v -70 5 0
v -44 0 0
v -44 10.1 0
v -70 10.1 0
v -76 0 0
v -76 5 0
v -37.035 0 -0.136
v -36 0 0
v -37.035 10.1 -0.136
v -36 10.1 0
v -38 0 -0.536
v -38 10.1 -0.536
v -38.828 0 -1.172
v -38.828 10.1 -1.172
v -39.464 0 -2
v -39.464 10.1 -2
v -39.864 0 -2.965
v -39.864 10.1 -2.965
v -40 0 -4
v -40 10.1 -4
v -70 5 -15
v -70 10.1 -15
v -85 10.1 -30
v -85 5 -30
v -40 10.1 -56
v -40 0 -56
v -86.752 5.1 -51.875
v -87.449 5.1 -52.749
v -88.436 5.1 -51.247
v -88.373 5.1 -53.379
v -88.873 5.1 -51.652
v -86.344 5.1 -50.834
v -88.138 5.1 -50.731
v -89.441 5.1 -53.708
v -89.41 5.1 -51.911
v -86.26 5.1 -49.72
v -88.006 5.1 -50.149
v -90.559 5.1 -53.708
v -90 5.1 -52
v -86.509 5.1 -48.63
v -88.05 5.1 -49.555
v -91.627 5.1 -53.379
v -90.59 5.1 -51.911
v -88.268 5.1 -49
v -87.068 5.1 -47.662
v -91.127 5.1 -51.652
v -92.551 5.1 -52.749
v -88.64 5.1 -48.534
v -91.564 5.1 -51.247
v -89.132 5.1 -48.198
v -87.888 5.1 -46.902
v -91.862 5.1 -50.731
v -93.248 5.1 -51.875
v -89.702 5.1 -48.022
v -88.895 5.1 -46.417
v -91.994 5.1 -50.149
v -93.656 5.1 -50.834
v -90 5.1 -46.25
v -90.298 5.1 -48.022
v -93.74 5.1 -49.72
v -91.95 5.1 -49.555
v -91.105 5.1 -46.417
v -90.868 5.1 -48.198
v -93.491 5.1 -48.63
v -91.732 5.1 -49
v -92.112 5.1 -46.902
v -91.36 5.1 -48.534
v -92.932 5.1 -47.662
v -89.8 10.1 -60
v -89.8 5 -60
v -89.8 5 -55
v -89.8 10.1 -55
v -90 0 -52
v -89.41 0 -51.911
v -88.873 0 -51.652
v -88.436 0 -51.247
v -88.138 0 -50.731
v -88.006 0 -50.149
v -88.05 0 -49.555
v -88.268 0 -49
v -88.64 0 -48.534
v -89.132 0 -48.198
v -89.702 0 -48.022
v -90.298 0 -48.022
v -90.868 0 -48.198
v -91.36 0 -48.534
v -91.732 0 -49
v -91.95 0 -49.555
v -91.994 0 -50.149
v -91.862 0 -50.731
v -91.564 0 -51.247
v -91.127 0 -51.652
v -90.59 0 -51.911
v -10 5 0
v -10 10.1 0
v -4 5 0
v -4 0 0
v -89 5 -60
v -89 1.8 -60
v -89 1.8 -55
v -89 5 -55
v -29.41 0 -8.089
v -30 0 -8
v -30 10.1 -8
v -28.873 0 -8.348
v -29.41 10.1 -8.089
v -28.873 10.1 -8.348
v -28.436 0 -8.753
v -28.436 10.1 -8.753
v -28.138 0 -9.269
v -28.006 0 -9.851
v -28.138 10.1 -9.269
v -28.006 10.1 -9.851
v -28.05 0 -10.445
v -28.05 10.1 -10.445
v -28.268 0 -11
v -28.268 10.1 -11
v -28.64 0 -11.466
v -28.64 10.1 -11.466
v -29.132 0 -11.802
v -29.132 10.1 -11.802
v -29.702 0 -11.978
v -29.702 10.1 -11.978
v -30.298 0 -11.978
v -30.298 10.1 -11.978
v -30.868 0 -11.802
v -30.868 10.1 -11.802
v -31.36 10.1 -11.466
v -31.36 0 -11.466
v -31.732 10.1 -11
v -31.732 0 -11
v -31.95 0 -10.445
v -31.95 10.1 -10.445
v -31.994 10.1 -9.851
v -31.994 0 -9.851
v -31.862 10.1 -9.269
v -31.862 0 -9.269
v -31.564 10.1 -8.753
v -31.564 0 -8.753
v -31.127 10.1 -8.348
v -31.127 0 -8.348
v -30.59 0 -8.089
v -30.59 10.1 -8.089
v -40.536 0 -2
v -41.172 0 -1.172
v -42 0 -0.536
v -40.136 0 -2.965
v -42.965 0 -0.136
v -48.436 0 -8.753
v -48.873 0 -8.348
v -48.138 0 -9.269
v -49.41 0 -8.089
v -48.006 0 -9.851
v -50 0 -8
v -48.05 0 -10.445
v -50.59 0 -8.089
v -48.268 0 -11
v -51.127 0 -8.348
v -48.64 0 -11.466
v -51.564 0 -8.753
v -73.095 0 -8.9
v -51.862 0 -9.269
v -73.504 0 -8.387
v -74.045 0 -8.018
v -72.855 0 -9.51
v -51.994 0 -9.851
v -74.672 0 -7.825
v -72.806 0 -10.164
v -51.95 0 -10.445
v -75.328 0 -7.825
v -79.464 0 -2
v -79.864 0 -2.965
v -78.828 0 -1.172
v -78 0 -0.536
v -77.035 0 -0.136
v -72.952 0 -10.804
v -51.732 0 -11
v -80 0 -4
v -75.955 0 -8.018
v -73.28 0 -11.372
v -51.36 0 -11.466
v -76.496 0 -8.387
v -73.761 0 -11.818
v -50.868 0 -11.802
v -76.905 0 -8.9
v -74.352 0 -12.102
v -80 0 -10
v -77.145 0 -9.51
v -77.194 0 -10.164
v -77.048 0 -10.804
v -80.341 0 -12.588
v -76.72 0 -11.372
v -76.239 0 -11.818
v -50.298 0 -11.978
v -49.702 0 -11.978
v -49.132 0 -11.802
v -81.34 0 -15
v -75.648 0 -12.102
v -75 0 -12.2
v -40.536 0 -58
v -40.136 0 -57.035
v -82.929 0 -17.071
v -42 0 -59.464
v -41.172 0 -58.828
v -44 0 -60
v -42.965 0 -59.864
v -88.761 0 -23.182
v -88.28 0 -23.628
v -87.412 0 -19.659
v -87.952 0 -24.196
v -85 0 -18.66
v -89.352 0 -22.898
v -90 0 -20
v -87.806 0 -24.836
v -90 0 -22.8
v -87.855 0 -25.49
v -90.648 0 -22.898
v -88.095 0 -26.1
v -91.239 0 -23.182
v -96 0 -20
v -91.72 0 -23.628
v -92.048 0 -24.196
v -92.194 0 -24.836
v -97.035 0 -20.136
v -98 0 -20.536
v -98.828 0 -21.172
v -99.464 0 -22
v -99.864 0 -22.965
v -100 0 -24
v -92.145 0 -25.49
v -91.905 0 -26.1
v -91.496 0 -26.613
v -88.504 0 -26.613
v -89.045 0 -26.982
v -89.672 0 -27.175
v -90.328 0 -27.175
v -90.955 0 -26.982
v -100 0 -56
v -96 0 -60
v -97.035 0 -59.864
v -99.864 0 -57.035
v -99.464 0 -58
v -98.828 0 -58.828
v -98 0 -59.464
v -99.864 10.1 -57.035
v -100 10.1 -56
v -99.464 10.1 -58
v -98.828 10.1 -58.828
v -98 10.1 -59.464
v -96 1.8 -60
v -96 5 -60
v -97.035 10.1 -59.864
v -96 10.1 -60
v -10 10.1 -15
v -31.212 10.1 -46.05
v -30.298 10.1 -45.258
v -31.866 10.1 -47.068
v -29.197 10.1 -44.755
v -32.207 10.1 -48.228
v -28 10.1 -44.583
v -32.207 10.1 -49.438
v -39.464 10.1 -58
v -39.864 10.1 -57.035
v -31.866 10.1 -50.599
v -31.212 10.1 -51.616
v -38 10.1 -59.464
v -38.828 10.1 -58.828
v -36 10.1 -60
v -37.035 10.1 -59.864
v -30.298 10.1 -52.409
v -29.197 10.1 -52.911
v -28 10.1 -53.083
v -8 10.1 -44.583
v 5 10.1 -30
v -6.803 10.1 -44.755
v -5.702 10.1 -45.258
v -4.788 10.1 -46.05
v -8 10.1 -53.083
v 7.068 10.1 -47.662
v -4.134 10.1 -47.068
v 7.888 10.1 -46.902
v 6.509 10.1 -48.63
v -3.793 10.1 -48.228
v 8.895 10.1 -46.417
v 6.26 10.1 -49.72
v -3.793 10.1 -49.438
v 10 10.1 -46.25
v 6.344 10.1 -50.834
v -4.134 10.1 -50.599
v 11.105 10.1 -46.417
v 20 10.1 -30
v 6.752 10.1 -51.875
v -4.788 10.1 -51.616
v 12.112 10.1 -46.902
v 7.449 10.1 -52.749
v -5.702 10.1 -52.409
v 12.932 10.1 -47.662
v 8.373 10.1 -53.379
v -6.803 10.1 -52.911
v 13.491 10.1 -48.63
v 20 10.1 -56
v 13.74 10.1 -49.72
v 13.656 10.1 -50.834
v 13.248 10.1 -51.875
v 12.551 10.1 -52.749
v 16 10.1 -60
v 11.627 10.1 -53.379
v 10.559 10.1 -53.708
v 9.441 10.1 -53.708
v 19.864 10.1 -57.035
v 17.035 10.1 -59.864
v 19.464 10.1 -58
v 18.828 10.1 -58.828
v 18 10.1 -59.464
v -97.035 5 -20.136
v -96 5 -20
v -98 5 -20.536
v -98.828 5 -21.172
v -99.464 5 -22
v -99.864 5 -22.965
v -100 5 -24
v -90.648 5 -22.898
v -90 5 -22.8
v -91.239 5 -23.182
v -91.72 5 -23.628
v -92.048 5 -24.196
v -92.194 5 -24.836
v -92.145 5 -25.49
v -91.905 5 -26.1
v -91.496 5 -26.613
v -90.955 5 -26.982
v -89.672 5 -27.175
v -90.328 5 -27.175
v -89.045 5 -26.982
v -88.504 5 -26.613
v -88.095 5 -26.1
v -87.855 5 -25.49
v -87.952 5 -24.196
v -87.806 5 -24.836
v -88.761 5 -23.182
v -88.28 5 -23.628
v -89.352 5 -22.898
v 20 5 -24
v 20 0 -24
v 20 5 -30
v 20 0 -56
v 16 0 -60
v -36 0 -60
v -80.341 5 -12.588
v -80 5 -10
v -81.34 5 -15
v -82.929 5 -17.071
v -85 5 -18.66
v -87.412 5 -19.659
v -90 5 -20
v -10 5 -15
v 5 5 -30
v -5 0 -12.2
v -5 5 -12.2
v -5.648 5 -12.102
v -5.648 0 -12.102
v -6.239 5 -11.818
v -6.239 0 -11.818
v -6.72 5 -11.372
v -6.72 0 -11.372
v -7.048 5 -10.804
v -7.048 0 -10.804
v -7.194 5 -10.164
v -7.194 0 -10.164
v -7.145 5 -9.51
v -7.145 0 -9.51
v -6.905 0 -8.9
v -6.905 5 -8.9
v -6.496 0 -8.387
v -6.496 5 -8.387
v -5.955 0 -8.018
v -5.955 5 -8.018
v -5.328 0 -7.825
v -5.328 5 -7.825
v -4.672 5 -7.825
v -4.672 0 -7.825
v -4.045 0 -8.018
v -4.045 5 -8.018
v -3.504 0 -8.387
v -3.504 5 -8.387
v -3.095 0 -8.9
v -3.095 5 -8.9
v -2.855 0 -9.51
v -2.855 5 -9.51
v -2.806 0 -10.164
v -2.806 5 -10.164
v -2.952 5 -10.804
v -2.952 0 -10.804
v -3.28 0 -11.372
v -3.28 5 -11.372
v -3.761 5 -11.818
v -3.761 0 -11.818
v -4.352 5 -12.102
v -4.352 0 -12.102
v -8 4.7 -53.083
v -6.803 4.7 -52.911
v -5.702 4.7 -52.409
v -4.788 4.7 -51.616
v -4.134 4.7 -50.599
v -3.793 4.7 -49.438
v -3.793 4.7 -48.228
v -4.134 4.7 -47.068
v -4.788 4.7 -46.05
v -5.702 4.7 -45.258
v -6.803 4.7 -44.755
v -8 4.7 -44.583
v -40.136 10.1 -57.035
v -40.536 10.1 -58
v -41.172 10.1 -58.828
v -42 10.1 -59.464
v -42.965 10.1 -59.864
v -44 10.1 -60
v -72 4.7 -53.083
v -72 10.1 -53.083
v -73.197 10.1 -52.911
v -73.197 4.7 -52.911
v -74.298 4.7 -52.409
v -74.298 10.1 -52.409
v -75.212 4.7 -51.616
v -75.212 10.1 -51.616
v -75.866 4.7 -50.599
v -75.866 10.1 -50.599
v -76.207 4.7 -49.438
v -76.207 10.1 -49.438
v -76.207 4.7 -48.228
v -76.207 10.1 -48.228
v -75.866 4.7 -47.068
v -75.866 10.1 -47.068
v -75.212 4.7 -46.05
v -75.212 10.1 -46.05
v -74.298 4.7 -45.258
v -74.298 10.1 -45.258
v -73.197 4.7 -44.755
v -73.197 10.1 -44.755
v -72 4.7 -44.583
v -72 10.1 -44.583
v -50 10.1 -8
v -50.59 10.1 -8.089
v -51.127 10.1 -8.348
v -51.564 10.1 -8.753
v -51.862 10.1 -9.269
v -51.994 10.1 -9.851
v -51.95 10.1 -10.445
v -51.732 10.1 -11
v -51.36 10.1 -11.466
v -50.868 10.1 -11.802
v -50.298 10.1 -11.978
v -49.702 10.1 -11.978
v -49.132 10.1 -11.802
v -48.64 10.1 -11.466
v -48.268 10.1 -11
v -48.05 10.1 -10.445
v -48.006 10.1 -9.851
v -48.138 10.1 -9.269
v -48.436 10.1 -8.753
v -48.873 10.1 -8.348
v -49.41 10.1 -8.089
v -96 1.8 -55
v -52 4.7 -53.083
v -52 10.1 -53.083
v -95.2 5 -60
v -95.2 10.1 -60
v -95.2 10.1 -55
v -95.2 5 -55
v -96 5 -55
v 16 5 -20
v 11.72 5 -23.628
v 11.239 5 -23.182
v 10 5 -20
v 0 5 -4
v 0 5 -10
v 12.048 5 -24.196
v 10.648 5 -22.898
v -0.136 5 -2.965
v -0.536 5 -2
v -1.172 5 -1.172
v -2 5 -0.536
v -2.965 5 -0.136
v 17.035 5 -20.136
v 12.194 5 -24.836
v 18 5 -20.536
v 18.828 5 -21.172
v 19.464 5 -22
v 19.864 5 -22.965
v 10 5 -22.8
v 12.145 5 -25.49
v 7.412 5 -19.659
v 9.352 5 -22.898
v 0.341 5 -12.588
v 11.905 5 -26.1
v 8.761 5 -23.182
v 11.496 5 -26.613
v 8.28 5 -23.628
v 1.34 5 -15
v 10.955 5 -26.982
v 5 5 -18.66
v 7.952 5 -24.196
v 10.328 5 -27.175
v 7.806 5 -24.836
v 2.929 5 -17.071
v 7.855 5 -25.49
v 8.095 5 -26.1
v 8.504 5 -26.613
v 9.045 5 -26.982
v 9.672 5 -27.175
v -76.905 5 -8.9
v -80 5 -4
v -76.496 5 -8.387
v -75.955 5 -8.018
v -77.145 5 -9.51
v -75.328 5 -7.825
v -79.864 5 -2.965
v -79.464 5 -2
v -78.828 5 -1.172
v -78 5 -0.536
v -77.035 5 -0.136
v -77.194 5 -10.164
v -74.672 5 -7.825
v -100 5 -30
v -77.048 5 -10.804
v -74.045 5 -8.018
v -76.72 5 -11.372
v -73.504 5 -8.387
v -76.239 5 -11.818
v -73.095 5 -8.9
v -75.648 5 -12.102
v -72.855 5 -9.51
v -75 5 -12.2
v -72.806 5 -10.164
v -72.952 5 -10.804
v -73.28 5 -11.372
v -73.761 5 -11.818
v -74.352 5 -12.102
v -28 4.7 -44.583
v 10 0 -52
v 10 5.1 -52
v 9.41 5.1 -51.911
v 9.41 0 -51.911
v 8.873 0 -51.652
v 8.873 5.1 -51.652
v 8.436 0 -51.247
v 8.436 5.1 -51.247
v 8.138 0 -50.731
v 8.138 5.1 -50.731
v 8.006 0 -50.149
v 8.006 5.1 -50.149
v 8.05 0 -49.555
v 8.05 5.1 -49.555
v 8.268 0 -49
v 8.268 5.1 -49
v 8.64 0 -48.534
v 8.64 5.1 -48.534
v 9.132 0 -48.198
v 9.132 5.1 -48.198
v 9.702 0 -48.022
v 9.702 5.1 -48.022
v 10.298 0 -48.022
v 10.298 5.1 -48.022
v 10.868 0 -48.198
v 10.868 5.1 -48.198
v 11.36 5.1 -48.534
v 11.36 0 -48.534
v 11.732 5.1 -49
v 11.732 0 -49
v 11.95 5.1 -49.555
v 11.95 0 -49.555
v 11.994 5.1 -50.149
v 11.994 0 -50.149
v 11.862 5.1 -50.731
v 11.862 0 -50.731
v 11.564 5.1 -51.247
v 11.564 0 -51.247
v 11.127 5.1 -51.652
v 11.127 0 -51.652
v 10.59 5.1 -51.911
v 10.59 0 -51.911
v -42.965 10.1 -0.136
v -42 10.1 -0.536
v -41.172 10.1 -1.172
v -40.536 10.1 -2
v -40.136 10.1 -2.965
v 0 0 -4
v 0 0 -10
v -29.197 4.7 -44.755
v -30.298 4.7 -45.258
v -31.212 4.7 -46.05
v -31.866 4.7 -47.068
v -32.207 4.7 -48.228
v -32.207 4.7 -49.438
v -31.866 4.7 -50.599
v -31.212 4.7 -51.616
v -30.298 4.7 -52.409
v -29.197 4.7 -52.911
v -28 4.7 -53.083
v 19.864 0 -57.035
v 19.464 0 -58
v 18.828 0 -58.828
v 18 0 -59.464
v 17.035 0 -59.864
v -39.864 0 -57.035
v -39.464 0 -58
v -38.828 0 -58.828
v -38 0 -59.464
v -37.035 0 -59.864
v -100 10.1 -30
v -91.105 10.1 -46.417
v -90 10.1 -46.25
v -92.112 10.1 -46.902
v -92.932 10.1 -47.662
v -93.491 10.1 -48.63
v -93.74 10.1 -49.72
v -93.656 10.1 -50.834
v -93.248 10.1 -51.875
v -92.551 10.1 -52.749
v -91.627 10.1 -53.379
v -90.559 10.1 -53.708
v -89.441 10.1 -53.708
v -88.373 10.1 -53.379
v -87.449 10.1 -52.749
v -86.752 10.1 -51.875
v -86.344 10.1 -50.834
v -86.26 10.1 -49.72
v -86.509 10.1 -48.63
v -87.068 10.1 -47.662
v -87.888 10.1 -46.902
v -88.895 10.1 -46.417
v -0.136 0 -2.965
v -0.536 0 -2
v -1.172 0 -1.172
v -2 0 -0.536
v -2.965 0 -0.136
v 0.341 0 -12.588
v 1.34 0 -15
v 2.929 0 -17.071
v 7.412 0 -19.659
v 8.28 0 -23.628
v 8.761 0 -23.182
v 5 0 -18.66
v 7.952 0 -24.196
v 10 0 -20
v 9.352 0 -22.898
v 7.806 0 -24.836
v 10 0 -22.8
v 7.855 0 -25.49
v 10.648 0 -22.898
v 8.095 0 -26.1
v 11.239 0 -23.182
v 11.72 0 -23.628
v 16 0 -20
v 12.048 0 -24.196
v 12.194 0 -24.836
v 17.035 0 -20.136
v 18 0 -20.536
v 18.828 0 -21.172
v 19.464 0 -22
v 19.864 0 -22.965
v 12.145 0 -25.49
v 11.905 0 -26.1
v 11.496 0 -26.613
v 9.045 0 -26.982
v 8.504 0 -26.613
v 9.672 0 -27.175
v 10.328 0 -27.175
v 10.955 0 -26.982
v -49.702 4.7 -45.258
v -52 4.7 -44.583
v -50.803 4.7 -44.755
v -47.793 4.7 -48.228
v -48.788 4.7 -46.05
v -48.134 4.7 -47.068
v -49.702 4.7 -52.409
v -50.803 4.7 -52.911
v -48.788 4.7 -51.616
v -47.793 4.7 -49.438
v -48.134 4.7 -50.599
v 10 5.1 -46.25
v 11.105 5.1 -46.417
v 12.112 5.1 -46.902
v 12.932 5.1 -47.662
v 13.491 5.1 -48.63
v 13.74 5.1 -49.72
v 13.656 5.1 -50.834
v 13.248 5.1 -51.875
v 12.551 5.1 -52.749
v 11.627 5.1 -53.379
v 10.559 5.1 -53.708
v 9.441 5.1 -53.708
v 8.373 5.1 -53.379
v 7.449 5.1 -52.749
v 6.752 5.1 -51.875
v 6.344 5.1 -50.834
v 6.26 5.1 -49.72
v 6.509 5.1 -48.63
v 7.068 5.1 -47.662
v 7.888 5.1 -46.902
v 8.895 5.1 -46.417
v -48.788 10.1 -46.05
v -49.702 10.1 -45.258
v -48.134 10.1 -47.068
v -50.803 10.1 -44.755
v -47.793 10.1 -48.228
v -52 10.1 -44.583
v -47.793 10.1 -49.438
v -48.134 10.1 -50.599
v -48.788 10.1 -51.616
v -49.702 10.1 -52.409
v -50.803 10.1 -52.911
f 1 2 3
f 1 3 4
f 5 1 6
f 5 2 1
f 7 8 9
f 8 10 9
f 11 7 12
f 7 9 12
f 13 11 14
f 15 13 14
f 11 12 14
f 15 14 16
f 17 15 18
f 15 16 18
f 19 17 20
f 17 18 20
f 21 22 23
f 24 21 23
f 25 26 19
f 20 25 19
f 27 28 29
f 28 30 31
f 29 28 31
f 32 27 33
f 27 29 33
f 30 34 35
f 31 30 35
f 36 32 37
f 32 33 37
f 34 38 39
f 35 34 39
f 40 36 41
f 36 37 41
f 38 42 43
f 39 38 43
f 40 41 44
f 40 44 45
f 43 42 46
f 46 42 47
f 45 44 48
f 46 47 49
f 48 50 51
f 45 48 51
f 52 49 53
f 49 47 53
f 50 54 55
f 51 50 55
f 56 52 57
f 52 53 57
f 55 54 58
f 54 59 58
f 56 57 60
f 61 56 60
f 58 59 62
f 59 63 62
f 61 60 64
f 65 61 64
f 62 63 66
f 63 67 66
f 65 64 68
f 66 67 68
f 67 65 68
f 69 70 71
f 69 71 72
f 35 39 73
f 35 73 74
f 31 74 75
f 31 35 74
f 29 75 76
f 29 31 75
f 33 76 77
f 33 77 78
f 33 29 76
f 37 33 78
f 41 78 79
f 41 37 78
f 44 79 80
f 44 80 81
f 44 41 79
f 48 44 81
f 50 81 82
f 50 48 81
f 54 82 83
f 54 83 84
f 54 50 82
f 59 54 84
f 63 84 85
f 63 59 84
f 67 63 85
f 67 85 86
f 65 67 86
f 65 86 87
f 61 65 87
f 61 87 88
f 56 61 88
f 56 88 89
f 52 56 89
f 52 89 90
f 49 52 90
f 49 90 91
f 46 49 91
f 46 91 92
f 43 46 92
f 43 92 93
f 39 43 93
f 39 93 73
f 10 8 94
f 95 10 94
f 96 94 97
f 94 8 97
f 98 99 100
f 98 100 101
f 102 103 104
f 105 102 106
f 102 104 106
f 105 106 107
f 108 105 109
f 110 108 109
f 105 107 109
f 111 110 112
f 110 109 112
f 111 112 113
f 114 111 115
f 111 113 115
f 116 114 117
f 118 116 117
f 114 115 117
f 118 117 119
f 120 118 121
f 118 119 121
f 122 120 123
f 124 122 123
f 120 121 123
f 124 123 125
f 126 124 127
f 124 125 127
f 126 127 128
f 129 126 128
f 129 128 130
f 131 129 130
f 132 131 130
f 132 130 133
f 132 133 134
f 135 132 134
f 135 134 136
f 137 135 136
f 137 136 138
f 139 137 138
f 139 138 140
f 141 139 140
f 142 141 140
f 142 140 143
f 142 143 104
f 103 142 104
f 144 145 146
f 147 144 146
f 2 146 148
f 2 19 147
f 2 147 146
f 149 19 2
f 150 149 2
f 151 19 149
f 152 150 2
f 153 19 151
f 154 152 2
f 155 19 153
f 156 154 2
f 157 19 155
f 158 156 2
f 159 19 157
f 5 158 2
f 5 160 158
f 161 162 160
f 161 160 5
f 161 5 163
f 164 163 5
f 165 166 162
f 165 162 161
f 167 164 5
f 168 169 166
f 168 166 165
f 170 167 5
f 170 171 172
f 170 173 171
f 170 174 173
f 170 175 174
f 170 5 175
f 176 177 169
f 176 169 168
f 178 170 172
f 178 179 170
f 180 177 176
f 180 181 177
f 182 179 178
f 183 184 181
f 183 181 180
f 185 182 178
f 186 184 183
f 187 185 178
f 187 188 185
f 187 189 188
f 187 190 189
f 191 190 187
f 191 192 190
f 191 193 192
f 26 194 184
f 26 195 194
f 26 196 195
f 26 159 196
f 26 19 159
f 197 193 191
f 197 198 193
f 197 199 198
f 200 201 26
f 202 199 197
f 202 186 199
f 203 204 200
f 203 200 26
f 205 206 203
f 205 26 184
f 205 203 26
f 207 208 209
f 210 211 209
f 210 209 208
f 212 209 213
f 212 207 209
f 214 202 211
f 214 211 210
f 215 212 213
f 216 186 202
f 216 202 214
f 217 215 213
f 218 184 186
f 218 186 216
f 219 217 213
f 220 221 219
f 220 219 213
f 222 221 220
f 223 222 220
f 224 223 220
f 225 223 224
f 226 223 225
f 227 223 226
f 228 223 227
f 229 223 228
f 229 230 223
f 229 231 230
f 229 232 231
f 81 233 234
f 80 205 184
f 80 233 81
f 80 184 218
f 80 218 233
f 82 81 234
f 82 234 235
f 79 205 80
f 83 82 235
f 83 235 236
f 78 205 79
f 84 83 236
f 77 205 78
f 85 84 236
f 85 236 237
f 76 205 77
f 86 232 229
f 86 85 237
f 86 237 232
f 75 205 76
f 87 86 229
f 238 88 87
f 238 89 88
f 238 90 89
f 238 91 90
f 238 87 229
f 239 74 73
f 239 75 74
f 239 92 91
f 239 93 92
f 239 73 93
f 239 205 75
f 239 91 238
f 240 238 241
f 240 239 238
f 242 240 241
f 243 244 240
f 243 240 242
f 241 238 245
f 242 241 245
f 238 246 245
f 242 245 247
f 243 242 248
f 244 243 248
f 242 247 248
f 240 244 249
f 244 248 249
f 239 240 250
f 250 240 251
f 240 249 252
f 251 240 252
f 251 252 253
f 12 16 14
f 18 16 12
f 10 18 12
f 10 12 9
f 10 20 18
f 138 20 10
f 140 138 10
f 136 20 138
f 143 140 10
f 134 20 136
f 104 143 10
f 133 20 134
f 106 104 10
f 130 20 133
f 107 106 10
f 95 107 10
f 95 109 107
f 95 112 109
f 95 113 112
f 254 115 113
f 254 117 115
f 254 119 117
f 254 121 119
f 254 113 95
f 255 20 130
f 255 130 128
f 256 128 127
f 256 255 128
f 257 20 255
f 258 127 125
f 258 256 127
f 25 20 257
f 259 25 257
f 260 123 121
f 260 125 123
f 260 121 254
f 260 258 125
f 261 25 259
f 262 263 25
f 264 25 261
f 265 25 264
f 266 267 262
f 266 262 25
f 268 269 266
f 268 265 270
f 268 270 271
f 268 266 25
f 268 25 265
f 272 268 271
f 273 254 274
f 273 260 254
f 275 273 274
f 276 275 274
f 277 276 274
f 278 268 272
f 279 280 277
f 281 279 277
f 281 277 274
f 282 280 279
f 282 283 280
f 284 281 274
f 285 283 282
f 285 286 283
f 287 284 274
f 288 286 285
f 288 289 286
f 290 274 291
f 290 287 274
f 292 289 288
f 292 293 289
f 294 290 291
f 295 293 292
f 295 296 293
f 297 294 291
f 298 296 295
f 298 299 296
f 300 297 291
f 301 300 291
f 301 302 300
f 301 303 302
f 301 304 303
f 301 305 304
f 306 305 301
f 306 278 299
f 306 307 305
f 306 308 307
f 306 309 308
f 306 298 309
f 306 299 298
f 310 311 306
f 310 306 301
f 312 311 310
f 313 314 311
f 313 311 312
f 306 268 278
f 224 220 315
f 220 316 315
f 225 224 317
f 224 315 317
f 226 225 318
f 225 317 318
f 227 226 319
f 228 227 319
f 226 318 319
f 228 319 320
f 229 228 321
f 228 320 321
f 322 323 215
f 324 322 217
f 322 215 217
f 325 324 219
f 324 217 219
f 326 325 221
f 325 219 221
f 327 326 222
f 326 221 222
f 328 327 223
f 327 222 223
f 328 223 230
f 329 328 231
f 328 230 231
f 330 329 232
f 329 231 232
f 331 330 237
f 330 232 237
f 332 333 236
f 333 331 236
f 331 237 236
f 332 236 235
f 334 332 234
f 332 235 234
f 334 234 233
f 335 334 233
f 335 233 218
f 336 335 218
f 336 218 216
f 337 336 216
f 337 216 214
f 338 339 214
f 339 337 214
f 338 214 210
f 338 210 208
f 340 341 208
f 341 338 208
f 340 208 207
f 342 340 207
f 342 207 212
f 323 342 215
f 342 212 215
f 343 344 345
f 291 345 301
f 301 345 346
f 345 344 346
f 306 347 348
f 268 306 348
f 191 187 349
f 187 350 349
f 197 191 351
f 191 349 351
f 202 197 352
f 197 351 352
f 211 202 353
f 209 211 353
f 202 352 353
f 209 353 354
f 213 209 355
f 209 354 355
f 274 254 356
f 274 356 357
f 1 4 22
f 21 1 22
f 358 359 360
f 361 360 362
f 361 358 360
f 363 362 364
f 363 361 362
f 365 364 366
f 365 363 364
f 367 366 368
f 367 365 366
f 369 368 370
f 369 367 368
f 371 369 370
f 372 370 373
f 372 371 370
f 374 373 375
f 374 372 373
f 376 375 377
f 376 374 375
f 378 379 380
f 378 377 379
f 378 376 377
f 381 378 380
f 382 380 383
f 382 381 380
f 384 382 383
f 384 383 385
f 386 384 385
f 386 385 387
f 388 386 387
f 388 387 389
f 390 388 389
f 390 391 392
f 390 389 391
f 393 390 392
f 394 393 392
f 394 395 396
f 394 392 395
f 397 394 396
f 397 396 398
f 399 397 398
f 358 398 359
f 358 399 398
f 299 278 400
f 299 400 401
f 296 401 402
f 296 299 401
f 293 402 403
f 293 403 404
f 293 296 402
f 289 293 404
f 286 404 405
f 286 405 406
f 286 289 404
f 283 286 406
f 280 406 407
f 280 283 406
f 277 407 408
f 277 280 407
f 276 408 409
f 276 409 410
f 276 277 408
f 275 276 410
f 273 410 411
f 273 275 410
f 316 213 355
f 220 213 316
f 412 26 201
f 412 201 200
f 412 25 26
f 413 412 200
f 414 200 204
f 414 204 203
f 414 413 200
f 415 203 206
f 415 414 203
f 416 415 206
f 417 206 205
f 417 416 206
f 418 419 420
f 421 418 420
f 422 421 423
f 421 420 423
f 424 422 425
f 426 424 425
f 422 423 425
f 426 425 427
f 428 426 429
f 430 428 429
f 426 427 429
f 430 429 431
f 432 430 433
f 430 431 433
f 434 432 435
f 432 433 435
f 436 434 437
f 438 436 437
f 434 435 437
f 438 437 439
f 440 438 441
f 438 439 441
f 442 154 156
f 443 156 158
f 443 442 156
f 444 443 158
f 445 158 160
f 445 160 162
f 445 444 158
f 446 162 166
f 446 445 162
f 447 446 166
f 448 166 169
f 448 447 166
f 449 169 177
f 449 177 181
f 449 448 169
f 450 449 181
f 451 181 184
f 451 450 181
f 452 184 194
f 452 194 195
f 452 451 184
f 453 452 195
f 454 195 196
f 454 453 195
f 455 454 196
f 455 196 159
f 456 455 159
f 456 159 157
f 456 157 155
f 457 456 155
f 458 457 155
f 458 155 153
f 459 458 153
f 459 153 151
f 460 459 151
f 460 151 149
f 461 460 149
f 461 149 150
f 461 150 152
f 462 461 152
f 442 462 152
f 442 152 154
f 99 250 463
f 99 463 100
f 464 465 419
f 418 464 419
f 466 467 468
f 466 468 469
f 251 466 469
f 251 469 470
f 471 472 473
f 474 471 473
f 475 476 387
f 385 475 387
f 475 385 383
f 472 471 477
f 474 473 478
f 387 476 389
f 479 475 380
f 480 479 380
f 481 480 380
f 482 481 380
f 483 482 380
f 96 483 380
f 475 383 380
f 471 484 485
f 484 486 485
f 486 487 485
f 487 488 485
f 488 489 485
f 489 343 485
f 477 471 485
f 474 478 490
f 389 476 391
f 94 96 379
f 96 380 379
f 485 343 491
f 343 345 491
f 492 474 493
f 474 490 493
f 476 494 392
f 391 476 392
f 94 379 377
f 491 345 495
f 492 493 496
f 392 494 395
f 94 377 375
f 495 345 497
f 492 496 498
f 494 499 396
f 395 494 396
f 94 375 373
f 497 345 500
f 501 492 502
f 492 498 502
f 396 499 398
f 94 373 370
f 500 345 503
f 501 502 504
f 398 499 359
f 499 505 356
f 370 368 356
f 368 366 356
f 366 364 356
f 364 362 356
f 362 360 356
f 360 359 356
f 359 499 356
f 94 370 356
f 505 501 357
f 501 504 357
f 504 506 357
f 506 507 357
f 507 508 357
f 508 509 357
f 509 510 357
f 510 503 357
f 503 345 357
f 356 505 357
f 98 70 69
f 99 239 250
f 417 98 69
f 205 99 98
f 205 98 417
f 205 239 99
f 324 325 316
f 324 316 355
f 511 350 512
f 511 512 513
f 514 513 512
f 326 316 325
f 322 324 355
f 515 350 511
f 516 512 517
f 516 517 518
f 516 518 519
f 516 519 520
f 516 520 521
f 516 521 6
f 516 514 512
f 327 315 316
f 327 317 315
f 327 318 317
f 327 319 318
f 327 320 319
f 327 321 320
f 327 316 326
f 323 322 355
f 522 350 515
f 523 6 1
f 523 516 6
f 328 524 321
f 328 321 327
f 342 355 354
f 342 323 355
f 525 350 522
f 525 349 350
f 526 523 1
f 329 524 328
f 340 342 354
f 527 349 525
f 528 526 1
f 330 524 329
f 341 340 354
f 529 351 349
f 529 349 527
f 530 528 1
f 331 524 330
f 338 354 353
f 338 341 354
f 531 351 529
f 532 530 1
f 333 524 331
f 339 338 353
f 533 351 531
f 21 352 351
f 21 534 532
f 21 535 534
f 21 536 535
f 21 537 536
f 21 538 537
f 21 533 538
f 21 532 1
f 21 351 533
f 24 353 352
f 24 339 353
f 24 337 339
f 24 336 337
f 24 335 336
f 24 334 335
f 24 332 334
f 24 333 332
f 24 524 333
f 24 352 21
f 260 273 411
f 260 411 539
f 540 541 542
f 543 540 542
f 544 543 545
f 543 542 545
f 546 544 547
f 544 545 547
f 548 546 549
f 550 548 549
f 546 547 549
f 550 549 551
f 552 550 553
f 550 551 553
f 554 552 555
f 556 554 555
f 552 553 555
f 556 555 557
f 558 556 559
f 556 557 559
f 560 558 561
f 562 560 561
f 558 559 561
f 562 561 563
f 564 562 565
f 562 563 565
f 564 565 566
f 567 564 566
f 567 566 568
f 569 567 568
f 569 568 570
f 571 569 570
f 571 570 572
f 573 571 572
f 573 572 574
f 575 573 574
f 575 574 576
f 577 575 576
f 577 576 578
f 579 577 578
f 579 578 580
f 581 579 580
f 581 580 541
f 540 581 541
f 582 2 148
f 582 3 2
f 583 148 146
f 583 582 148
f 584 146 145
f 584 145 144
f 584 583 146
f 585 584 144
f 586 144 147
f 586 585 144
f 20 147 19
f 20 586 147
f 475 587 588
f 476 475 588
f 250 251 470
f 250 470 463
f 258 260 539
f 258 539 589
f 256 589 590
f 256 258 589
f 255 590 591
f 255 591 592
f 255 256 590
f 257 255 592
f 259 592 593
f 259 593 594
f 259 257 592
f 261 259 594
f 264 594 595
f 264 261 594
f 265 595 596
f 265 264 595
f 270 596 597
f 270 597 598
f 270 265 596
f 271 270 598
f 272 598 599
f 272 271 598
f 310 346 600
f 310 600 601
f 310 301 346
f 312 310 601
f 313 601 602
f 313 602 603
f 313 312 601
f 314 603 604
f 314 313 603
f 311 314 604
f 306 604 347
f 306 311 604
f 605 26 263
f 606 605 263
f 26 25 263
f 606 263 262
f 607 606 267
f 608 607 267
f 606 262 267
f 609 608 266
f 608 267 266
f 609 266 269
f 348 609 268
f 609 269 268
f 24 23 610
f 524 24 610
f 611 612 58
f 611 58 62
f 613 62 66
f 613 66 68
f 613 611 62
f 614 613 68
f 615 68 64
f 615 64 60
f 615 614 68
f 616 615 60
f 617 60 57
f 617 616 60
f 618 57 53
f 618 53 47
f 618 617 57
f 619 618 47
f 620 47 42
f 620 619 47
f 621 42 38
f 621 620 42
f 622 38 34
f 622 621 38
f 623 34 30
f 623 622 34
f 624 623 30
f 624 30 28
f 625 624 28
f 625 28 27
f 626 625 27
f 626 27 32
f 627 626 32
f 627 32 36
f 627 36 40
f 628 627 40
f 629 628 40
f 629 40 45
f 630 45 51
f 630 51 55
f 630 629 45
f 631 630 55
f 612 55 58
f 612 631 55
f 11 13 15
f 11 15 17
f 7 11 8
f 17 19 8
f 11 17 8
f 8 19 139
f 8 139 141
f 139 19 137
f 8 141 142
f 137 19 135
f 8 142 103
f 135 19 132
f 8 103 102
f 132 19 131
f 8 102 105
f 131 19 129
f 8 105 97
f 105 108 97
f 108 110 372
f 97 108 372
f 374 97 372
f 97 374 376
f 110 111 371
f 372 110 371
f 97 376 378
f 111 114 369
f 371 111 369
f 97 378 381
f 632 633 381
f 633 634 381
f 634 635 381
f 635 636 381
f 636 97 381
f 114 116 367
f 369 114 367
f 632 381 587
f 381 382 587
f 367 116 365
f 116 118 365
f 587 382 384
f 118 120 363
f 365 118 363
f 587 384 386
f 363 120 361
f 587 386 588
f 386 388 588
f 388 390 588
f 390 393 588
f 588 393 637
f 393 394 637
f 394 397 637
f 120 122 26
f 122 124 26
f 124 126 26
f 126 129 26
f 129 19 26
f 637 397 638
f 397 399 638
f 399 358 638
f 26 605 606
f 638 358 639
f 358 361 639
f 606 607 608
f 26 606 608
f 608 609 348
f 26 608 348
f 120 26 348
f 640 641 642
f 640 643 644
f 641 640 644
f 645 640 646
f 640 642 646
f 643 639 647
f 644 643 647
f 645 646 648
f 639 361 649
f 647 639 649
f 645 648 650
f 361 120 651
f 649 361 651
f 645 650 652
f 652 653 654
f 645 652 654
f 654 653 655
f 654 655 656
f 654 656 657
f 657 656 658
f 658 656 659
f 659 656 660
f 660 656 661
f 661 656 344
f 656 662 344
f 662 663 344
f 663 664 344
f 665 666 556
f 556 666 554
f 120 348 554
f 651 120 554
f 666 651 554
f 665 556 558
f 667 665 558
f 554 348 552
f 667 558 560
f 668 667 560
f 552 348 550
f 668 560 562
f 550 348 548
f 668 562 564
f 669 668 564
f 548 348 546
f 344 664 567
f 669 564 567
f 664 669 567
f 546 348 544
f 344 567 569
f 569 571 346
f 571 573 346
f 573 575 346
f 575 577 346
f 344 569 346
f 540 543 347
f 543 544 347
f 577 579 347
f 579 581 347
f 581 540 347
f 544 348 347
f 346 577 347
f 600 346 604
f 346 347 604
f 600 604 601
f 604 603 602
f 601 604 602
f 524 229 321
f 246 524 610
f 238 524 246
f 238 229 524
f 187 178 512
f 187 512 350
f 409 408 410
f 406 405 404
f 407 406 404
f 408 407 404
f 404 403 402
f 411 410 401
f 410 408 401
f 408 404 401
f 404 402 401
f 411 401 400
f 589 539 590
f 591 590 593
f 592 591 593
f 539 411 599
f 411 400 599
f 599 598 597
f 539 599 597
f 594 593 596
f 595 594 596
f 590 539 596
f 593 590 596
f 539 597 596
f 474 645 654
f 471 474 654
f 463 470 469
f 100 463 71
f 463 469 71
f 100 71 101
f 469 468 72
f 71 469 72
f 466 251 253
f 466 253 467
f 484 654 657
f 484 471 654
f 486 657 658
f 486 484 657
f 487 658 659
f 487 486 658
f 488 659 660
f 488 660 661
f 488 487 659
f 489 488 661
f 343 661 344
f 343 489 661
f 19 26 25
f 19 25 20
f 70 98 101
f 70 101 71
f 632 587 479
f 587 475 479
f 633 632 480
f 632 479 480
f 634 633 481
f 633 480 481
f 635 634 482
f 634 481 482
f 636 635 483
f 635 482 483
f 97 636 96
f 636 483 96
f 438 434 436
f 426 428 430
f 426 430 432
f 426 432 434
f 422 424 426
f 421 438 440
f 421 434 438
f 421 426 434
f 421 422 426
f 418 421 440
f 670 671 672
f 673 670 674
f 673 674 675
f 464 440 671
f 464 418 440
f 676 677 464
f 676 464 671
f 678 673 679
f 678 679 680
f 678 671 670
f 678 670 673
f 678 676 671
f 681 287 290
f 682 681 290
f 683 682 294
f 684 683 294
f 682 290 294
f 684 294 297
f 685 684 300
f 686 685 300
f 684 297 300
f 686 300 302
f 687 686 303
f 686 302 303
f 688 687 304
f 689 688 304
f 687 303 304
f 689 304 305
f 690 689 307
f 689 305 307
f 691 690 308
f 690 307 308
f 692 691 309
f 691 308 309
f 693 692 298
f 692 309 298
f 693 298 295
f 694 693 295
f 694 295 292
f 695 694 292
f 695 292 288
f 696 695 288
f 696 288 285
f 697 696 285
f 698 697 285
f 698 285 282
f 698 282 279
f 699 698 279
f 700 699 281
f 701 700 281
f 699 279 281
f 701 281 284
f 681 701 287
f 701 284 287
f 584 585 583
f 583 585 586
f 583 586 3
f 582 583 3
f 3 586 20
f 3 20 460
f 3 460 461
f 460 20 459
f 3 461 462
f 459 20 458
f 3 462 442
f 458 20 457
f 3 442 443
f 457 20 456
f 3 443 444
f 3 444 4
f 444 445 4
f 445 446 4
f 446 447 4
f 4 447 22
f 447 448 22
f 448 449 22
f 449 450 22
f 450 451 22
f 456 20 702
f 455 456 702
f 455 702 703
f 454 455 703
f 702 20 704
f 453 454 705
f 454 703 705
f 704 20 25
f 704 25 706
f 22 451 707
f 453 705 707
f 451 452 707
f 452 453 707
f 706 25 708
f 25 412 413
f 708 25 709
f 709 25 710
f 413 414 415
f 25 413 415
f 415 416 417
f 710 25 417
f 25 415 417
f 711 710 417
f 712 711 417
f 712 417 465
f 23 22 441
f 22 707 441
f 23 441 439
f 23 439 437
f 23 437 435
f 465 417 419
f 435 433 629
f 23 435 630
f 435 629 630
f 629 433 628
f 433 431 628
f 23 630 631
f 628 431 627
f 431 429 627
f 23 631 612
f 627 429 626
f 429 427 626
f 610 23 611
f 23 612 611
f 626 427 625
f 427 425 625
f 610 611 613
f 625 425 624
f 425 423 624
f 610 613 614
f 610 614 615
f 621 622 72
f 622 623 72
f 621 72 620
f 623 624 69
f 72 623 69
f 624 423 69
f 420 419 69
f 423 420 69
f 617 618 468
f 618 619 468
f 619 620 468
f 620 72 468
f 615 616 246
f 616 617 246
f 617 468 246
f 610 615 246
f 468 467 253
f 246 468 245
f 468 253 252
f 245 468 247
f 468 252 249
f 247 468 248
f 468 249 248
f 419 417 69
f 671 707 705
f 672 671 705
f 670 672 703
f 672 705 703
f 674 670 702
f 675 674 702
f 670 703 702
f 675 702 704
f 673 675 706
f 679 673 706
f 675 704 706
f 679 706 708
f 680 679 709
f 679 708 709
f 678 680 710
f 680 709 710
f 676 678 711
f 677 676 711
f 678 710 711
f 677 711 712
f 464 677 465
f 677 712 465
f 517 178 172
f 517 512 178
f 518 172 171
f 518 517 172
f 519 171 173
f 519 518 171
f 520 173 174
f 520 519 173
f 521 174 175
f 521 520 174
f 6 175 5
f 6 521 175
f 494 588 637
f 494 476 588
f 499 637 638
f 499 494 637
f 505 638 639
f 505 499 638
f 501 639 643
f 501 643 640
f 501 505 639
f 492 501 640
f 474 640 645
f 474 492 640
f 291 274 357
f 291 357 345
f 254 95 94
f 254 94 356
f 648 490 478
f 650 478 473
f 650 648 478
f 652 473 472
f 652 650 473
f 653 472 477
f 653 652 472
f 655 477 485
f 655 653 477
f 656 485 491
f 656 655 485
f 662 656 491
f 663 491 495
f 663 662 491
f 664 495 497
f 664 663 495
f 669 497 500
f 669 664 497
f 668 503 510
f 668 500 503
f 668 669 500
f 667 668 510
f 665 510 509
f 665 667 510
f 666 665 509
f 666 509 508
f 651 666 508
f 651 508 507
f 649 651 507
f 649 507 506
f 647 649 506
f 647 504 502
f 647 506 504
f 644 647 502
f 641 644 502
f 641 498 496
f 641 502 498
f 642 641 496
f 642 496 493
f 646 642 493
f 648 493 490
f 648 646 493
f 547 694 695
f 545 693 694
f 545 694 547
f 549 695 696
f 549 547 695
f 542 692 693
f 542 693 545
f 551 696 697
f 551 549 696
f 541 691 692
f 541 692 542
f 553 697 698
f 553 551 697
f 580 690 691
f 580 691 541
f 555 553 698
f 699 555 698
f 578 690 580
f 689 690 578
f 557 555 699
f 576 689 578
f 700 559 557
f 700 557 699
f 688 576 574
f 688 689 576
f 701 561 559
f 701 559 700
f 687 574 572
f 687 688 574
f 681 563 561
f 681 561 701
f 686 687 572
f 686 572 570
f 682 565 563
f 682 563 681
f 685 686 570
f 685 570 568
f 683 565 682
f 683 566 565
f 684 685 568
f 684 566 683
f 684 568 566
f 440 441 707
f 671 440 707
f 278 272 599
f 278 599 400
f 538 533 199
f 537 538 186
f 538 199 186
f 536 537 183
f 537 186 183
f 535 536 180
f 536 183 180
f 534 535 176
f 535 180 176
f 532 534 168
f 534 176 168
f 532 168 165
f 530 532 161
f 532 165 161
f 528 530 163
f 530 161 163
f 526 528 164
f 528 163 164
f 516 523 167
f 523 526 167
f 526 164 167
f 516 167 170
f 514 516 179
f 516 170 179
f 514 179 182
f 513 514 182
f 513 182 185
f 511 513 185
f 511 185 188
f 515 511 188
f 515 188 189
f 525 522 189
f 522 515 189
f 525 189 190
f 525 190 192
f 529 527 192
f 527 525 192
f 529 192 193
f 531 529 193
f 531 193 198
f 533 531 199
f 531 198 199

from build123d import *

# Parameters (mm, degrees)
SKETCH1_R           = 2.2
BOSS_EXTRUDE1_DEPTH = 10.1
CUT_EXTRUDE2_DEPTH  = 5.4
CUT_EXTRUDE4_DEPTH  = 5.1
SKETCH9_R           = 2
CUT_EXTRUDE5_DEPTH  = 73.814902321
SKETCH10_R          = 3.75
CUT_EXTRUDE6_DEPTH  = 5
FILLET2_R           = 10
FILLET3_R           = 4
CUT_EXTRUDE7_DEPTH  = 5


with BuildPart() as part:
    # Sketch1 → Boss-Extrude1 (new body)
    with BuildSketch(Plane(origin=(0, 0, 0), x_dir=(1, 0, 0), z_dir=(0, 1, 0))):
        Polygon((0, 0), (0, 20), (20, 20), (20, 60), (-40, 60), (-40, 0), align=None)
        with Locations(Location((10, 25, 0), (0, 0, 270))):
            Circle(SKETCH1_R, mode=Mode.SUBTRACT)
        with Locations(Location((-5, 10, 0), (0, 0, 90))):
            Circle(SKETCH1_R, mode=Mode.SUBTRACT)
    extrude(amount=BOSS_EXTRUDE1_DEPTH)

    # Sketch4 → Cut-Extrude2 (cut)
    with BuildSketch(Plane(origin=(0, 10.1, 0), x_dir=(1, 0, 0), z_dir=(0, 1, 0))):
        with BuildLine():
            Line((-28, 53.083248844), (-8, 53.083248844))
            ThreePointArc((-8, 53.083248844), (-3.75, 48.833248844), (-8, 44.583248844))
            Line((-8, 44.583248844), (-28, 44.583248844))
            ThreePointArc((-28, 44.583248844), (-32.25, 48.833248844), (-28, 53.083248844))
        make_face()
    extrude(amount=-CUT_EXTRUDE2_DEPTH, mode=Mode.SUBTRACT)

    # Sketch7 → Cut-Extrude4 (cut)
    with BuildSketch(Plane(origin=(0, 10.1, 0), x_dir=(1, 0, 0), z_dir=(0, 1, 0))):
        Polygon((20, 0), (-10, 0), (-10, 15), (5, 30), (20, 30), align=None)
    extrude(amount=-CUT_EXTRUDE4_DEPTH, mode=Mode.SUBTRACT)

    # Sketch9 → Cut-Extrude5 (cut, through all)
    with BuildSketch(Plane(origin=(0, 10.1, 0), x_dir=(1, 0, 0), z_dir=(0, 1, 0))):
        with Locations(Location((-30, 10, 0), (0, 0, 270))):
            Circle(SKETCH9_R)
        with Locations(Location((10, 50, 0), (0, 0, 90))):
            Circle(SKETCH9_R)
    extrude(amount=-CUT_EXTRUDE5_DEPTH, mode=Mode.SUBTRACT)

    # Sketch10 → Cut-Extrude6 (cut)
    with BuildSketch(Plane(origin=(0, 10.1, 0), x_dir=(1, 0, 0), z_dir=(0, 1, 0))):
        with Locations(Location((10, 50, 0), (0, 0, 270))):
            Circle(SKETCH10_R)
    extrude(amount=-CUT_EXTRUDE6_DEPTH, mode=Mode.SUBTRACT)

    # Fillet2
    fillet2_edges = [part.edges().sort_by_distance(p)[0] for p in [
        (0, 2.5, -20),
    ]]
    fillet(fillet2_edges, radius=FILLET2_R)

    # Fillet3
    fillet3_edges = [part.edges().sort_by_distance(p)[0] for p in [
        (-40, 5.05, -60),
        (20, 5.05, -60),
        (-40, 5.05, 0),
        (20, 2.5, -20),
        (0, 2.5, 0),
    ]]
    fillet(fillet3_edges, radius=FILLET3_R)


with BuildPart() as body_2:
    # Mirror1: mirrored copy
    add(part.part.mirror(Plane(origin=(-40, 10.1, 0), x_dir=(0, 0, 1), z_dir=(1, 0, 0))))

    # Sketch11 → Cut-Extrude7 (cut)
    with BuildSketch(Plane(origin=(0, 0, -60), x_dir=(-1, 0, 0), z_dir=(0, 0, -1))):
        Polygon((96, 1.8), (89, 1.8), (89, 5), (89.8, 5), (89.8, 10.1), (95.2, 10.1), (95.2, 5), (96, 5), align=None)
    extrude(amount=-CUT_EXTRUDE7_DEPTH, mode=Mode.SUBTRACT)


solid = Compound([part.part, body_2.part])
